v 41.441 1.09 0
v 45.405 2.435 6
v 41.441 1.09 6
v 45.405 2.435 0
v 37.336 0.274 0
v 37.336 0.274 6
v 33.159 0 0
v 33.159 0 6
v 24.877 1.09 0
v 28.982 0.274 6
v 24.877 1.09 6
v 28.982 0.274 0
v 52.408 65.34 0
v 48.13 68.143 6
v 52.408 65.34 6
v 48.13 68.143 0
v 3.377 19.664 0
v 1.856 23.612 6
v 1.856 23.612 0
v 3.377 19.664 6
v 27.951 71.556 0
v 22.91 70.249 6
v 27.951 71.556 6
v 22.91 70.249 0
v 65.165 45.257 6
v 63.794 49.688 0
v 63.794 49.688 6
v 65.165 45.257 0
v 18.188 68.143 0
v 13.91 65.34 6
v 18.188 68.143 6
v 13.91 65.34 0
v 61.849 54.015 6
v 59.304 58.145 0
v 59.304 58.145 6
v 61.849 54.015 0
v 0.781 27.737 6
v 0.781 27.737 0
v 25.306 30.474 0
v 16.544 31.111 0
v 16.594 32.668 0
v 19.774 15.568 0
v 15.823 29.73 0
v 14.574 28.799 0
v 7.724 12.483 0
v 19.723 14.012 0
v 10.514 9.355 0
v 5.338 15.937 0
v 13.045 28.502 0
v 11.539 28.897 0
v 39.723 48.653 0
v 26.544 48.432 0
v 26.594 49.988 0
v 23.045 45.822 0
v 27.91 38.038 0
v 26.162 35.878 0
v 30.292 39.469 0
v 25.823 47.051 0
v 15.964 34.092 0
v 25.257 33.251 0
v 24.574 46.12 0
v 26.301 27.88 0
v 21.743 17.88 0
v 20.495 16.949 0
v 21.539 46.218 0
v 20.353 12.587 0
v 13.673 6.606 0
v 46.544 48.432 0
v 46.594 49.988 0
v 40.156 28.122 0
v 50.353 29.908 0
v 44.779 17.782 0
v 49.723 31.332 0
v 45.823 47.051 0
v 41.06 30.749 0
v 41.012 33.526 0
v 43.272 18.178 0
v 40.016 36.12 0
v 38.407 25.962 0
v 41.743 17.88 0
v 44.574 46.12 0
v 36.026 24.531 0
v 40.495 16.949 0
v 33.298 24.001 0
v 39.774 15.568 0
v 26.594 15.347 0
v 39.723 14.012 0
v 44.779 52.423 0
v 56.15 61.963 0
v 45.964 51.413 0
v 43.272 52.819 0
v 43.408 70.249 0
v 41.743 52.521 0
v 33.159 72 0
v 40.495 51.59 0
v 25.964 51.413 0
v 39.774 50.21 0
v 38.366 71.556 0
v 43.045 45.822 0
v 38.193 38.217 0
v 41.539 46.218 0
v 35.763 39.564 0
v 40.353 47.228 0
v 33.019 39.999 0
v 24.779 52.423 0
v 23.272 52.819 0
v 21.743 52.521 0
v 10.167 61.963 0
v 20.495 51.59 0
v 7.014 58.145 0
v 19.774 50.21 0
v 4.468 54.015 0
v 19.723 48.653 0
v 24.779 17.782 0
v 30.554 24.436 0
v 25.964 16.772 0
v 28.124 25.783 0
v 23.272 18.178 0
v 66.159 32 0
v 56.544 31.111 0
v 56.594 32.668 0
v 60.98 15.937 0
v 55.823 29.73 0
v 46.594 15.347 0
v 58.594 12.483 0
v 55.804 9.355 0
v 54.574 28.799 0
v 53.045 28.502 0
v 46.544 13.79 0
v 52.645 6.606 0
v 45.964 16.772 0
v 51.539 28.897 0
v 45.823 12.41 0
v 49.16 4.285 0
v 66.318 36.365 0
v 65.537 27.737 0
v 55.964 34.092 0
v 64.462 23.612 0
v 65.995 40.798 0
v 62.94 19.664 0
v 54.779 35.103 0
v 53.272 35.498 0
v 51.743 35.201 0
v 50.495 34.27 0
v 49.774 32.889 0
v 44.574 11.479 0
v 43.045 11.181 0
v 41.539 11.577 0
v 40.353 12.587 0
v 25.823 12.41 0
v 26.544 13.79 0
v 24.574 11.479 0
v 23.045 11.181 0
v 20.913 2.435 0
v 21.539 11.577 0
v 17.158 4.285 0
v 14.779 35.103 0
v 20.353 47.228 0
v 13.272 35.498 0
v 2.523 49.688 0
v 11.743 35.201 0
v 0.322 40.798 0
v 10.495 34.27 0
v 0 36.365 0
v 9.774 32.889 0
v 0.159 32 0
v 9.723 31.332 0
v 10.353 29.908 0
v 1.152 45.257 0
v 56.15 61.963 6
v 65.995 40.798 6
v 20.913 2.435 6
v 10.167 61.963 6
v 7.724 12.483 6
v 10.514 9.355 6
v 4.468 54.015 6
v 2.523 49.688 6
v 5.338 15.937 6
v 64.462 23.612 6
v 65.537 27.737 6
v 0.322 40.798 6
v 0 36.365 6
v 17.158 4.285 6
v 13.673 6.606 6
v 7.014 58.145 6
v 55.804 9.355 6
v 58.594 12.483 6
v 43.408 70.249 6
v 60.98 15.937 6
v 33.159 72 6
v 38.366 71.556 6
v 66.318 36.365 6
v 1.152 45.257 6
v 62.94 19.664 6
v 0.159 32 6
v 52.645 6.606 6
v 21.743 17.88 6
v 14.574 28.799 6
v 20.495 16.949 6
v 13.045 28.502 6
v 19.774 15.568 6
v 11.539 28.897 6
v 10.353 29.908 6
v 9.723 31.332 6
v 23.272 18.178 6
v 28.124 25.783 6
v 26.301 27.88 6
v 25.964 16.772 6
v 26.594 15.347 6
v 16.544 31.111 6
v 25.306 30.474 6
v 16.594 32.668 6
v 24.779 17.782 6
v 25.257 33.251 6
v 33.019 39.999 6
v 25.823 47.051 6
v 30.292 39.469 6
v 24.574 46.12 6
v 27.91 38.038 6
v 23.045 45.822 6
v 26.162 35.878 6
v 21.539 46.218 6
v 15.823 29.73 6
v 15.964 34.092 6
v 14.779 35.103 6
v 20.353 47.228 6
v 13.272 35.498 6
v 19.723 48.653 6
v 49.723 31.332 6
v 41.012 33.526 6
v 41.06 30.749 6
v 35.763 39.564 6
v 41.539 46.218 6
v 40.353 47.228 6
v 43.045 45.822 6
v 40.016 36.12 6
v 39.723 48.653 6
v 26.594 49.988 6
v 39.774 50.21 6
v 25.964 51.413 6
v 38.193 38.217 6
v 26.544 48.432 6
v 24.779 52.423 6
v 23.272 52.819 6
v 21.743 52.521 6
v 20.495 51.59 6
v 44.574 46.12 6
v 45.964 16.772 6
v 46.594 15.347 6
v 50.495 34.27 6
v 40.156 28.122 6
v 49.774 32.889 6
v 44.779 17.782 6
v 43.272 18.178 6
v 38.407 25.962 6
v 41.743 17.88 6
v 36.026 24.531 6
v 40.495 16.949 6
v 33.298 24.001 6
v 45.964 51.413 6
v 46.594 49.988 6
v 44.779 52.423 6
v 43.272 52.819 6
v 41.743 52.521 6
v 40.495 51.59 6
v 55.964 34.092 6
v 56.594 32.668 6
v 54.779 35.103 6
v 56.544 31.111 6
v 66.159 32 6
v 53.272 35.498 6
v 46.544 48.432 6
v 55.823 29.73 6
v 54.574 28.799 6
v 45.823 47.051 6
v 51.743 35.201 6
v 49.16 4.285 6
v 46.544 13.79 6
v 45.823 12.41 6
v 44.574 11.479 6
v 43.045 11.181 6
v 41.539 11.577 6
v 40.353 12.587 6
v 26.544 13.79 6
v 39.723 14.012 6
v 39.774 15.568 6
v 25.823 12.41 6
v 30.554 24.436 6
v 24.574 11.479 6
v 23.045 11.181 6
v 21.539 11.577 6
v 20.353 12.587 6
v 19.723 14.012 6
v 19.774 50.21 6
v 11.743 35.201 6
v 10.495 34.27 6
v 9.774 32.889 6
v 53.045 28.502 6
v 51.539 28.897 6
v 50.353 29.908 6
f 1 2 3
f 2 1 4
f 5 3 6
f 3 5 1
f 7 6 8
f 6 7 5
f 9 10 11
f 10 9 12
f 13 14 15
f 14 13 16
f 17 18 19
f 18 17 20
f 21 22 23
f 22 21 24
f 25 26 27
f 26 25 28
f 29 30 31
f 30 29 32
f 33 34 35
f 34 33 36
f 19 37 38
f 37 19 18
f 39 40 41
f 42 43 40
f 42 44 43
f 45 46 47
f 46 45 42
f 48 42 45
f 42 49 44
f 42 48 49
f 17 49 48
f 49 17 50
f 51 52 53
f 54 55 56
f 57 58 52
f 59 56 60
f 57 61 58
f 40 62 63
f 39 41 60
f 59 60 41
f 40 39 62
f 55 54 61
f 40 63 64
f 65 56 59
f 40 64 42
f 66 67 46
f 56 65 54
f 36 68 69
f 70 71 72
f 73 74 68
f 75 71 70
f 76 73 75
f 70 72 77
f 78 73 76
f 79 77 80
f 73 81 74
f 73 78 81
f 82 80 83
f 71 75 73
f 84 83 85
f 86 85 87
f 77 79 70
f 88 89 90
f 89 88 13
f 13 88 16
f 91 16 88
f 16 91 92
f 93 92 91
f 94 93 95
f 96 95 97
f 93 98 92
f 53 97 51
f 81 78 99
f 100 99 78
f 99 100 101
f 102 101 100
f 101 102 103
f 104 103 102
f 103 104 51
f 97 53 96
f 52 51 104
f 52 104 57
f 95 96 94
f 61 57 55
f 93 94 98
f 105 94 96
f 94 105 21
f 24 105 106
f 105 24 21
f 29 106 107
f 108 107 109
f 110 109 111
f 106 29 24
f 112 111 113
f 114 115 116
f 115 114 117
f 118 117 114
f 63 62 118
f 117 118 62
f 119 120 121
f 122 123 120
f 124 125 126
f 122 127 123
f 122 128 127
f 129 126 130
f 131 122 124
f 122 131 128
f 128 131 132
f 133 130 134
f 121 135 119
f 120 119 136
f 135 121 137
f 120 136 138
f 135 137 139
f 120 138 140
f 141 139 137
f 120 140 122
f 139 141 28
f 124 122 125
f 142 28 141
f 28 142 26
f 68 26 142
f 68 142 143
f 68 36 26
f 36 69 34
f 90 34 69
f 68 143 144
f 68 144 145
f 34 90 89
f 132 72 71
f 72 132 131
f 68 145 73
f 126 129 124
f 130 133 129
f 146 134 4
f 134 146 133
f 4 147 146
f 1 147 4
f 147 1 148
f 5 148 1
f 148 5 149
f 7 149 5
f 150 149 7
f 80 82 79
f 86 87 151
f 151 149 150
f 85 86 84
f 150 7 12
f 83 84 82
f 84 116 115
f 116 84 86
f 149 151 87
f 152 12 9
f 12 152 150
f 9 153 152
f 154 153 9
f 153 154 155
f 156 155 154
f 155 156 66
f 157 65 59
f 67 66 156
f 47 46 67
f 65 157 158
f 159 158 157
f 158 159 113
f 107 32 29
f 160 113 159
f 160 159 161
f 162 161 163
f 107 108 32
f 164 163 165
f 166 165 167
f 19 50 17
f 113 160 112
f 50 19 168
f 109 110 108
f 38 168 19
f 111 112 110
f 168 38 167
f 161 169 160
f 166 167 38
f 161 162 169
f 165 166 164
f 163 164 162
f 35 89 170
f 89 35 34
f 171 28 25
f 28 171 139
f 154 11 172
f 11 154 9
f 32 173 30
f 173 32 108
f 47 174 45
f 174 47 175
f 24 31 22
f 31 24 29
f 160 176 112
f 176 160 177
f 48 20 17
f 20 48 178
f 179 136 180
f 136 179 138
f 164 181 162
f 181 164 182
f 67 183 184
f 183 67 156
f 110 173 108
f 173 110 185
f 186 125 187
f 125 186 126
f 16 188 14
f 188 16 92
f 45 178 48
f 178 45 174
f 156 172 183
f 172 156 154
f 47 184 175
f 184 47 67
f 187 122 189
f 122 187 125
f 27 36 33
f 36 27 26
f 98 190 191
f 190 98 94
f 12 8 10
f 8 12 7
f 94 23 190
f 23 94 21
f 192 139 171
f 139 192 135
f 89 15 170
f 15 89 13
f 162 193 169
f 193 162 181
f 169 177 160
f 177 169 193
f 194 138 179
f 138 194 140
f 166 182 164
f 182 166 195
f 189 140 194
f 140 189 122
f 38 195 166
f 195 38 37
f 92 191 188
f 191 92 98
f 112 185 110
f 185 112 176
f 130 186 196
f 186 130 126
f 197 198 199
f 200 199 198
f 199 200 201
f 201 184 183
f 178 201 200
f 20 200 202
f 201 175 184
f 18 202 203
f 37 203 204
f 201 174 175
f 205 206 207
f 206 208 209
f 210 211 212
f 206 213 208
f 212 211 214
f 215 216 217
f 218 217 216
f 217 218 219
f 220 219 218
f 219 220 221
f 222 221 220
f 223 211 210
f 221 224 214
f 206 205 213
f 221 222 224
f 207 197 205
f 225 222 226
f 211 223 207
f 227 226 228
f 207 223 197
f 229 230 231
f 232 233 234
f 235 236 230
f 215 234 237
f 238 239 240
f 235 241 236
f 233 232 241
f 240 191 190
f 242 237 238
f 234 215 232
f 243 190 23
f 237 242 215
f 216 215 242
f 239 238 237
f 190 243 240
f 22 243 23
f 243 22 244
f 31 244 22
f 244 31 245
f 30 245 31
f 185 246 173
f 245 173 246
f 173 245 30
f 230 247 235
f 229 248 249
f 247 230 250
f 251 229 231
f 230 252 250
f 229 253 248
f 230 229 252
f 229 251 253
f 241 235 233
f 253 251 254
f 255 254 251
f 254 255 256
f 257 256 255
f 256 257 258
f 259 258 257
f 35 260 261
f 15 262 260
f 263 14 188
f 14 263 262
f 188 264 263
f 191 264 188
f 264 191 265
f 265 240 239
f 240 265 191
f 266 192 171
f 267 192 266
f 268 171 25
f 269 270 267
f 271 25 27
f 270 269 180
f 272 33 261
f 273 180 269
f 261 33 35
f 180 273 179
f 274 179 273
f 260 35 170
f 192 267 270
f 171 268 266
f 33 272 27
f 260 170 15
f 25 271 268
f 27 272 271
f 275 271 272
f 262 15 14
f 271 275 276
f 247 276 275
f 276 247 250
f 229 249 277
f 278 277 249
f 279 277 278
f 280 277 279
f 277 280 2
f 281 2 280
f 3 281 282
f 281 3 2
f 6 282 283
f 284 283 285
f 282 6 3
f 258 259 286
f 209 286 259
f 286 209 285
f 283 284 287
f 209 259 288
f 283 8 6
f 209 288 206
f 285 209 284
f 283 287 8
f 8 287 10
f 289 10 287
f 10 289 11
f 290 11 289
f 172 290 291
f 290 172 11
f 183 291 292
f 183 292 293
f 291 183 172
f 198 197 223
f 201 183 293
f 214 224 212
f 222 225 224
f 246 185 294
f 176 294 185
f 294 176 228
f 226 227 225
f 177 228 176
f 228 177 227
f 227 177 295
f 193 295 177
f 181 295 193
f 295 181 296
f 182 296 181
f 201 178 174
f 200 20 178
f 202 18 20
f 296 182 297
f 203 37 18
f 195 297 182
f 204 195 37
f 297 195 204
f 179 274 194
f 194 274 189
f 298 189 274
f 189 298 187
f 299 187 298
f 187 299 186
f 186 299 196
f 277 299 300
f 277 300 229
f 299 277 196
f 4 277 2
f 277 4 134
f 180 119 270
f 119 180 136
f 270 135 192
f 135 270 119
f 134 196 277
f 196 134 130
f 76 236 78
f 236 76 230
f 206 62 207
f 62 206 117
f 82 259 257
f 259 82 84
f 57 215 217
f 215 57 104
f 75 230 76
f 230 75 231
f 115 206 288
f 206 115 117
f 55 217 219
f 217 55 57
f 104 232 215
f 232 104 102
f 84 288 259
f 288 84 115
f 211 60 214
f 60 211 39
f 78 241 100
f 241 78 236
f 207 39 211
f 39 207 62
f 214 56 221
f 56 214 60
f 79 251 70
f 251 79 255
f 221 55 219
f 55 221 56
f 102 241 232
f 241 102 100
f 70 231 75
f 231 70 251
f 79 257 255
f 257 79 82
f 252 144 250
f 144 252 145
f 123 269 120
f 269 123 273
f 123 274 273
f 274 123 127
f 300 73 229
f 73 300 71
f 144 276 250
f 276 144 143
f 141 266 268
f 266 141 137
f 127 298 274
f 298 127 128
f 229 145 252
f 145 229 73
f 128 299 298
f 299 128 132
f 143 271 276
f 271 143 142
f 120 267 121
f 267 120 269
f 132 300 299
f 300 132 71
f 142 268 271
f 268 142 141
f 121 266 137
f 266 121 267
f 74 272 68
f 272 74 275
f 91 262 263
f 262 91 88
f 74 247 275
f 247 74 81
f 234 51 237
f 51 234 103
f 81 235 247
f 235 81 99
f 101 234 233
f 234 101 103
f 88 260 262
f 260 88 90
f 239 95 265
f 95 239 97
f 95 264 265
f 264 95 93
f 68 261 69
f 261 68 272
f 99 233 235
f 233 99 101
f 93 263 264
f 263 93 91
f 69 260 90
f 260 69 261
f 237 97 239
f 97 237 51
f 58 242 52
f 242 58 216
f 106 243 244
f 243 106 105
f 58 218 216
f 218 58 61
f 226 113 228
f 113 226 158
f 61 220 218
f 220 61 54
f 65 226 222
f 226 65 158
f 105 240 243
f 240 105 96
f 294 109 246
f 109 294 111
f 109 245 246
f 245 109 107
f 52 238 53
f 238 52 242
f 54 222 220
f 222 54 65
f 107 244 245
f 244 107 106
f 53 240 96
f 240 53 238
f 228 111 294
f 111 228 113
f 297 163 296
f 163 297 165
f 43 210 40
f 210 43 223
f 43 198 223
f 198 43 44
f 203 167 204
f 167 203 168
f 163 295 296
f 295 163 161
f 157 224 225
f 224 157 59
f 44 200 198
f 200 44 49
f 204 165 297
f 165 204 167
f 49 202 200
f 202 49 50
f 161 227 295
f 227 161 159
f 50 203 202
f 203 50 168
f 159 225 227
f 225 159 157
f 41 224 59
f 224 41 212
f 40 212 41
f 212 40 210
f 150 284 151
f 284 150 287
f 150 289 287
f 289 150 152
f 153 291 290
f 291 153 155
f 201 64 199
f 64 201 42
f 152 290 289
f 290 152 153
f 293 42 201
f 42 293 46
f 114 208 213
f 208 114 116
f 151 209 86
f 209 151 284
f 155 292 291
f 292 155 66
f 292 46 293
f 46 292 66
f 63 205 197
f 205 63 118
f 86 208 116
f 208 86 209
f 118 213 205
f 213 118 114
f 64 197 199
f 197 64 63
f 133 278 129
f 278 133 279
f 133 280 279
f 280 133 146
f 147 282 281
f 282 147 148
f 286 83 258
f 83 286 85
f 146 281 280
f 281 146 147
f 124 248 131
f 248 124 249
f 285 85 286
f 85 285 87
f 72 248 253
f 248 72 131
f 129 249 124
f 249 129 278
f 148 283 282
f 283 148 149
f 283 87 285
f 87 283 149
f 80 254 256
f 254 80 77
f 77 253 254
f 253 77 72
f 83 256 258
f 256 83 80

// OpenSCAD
$fn = 32;

// ----------------------------------------------------------------------
// Cam plate: single_lobe cam, base R32
// ----------------------------------------------------------------------

// --- parameters (mm) ---
base_r = 32;              // base circle radius
lobe_h = 8;               // cam lobe rise
bore_r = 8;               // shaft bore radius
plate_t = 6;              // plate thickness, Z (extrusion height)
ring_r = 20;              // lightening ring radius
bolt_r = 3.5;             // lightening hole radius

profile = [[66.159, 32], [66.318, 36.365], [65.995, 40.798], [65.165, 45.257], [63.794, 49.688], [61.849, 54.015], [59.304, 58.145], [56.15, 61.963], [52.408, 65.34], [48.13, 68.143], [43.408, 70.249], [38.366, 71.556], [33.159, 72], [27.951, 71.556], [22.91, 70.249], [18.188, 68.143], [13.91, 65.34], [10.167, 61.963], [7.014, 58.145], [4.468, 54.015], [2.523, 49.688], [1.152, 45.257], [0.322, 40.798], [0, 36.365], [0.159, 32], [0.781, 27.737], [1.856, 23.612], [3.377, 19.664], [5.338, 15.937], [7.724, 12.483], [10.514, 9.355], [13.673, 6.606], [17.158, 4.285], [20.913, 2.435], [24.877, 1.09], [28.982, 0.274], [33.159, 0], [37.336, 0.274], [41.441, 1.09], [45.405, 2.435], [49.16, 4.285], [52.645, 6.606], [55.804, 9.355], [58.594, 12.483], [60.98, 15.937], [62.94, 19.664], [64.462, 23.612], [65.537, 27.737]];  // primary outline, 48 points, counter clockwise
void_1 = [[41.012, 33.526], [40.016, 36.12], [38.193, 38.217], [35.763, 39.564], [33.019, 39.999], [30.292, 39.469], [27.91, 38.038], [26.162, 35.878], [25.257, 33.251], [25.306, 30.474], [26.301, 27.88], [28.124, 25.783], [30.554, 24.436], [33.298, 24.001], [36.026, 24.531], [38.407, 25.962], [40.156, 28.122], [41.06, 30.749]];  // shaft bore, 18 points
void_2 = [[56.594, 32.668], [55.964, 34.092], [54.779, 35.103], [53.272, 35.498], [51.743, 35.201], [50.495, 34.27], [49.774, 32.889], [49.723, 31.332], [50.353, 29.908], [51.539, 28.897], [53.045, 28.502], [54.574, 28.799], [55.823, 29.73], [56.544, 31.111]];  // lightening hole 1, 14 points
void_3 = [[46.594, 49.988], [45.964, 51.413], [44.779, 52.423], [43.272, 52.819], [41.743, 52.521], [40.495, 51.59], [39.774, 50.21], [39.723, 48.653], [40.353, 47.228], [41.539, 46.218], [43.045, 45.822], [44.574, 46.12], [45.823, 47.051], [46.544, 48.432]];  // lightening hole 2, 14 points
void_4 = [[26.594, 49.988], [25.964, 51.413], [24.779, 52.423], [23.272, 52.819], [21.743, 52.521], [20.495, 51.59], [19.774, 50.21], [19.723, 48.653], [20.353, 47.228], [21.539, 46.218], [23.045, 45.822], [24.574, 46.12], [25.823, 47.051], [26.544, 48.432]];  // lightening hole 3, 14 points
void_5 = [[16.594, 32.668], [15.964, 34.092], [14.779, 35.103], [13.272, 35.498], [11.743, 35.201], [10.495, 34.27], [9.774, 32.889], [9.723, 31.332], [10.353, 29.908], [11.539, 28.897], [13.045, 28.502], [14.574, 28.799], [15.823, 29.73], [16.544, 31.111]];  // lightening hole 4, 14 points
void_6 = [[26.594, 15.347], [25.964, 16.772], [24.779, 17.782], [23.272, 18.178], [21.743, 17.88], [20.495, 16.949], [19.774, 15.568], [19.723, 14.012], [20.353, 12.587], [21.539, 11.577], [23.045, 11.181], [24.574, 11.479], [25.823, 12.41], [26.544, 13.79]];  // lightening hole 5, 14 points
void_7 = [[46.594, 15.347], [45.964, 16.772], [44.779, 17.782], [43.272, 18.178], [41.743, 17.88], [40.495, 16.949], [39.774, 15.568], [39.723, 14.012], [40.353, 12.587], [41.539, 11.577], [43.045, 11.181], [44.574, 11.479], [45.823, 12.41], [46.544, 13.79]];  // lightening hole 6, 14 points

// --- the one profile operation ---
difference() {
  linear_extrude(height = plate_t) polygon(points = profile);
  translate([0, 0, -1])
    linear_extrude(height = plate_t + 2) polygon(points = void_1);
  translate([0, 0, -1])
    linear_extrude(height = plate_t + 2) polygon(points = void_2);
  translate([0, 0, -1])
    linear_extrude(height = plate_t + 2) polygon(points = void_3);
  translate([0, 0, -1])
    linear_extrude(height = plate_t + 2) polygon(points = void_4);
  translate([0, 0, -1])
    linear_extrude(height = plate_t + 2) polygon(points = void_5);
  translate([0, 0, -1])
    linear_extrude(height = plate_t + 2) polygon(points = void_6);
  translate([0, 0, -1])
    linear_extrude(height = plate_t + 2) polygon(points = void_7);
}
